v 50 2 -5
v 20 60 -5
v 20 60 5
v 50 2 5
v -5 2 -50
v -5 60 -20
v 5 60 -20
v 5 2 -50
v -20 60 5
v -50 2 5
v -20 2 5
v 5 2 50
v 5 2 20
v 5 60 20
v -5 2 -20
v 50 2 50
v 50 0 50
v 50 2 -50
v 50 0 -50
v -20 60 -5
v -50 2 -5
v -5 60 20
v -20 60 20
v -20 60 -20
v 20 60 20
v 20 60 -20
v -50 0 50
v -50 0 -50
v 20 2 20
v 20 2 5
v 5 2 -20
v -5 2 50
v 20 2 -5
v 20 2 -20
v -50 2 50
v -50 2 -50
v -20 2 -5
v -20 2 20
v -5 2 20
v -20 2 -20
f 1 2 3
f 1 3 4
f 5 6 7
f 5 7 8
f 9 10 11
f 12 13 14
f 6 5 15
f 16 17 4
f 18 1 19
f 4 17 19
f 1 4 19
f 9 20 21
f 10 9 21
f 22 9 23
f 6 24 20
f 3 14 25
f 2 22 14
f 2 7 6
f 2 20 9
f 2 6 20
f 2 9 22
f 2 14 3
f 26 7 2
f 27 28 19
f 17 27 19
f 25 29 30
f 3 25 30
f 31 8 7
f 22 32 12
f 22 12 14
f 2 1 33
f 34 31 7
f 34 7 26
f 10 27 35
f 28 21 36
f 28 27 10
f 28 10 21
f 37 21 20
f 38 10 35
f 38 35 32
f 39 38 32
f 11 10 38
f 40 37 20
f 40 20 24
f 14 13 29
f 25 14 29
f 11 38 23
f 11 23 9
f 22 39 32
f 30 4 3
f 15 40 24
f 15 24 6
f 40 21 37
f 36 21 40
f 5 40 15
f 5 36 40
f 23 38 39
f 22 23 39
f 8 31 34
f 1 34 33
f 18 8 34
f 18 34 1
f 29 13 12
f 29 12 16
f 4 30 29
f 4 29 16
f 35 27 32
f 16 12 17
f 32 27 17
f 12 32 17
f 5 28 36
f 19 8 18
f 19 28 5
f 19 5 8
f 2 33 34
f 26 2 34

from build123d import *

# Parameters (mm, degrees)
CROQUIS2_W                   = 100
CROQUIS2_H                   = 100
CROQUIS2_W_2                 = 40
CROQUIS2_H_2                 = 40
SALIENTE_EXTRUIR1_DEPTH      = 2
CROQUIS2_2_W                 = 40
CROQUIS2_2_H                 = 40
SALIENTE_EXTRUIR2_DEPTH      = 60
SALIENTE_EXTRUIR3_DEPTH      = 5
SALIENTE_EXTRUIR3_DEPTH_BACK = 5
SALIENTE_EXTRUIR4_DEPTH      = 5
SALIENTE_EXTRUIR4_DEPTH_BACK = 5


with BuildPart() as part:
    # Croquis2 → Saliente-Extruir1 (new body)
    with BuildSketch(Plane(origin=(0, 0, 0), x_dir=(1, 0, 0), z_dir=(0, 1, 0))):
        Rectangle(CROQUIS2_W, CROQUIS2_H)
        Rectangle(CROQUIS2_W_2, CROQUIS2_H_2, mode=Mode.SUBTRACT)
    extrude(amount=SALIENTE_EXTRUIR1_DEPTH)

    # Croquis2<2> → Saliente-Extruir2 (add)
    with BuildSketch(Plane(origin=(0, 0, 0), x_dir=(1, 0, 0), z_dir=(0, 1, 0))):
        Rectangle(CROQUIS2_2_W, CROQUIS2_2_H)
    extrude(amount=SALIENTE_EXTRUIR2_DEPTH)

    # Croquis4 → Saliente-Extruir3 (add, two sides: drawn at the far end of the back side and taken through both)
    with BuildSketch(Plane(origin=(0, 0, 0), x_dir=(0, 0, -1), z_dir=(1, 0, 0)).offset(-SALIENTE_EXTRUIR3_DEPTH_BACK)):
        Polygon((20, 60), (50, 2), (20, 2), align=None)
        Polygon((-20, 2), (-50, 2), (-20, 60), align=None)
    extrude(amount=SALIENTE_EXTRUIR3_DEPTH + SALIENTE_EXTRUIR3_DEPTH_BACK)

    # Croquis5 → Saliente-Extruir4 (add, two sides: drawn at the far end of the back side and taken through both)
    with BuildSketch(Plane.XY.offset(-SALIENTE_EXTRUIR4_DEPTH_BACK)):
        Polygon((20, 60), (50, 2), (20, 2), align=None)
        Polygon((-20, 60), (-50, 2), (-20, 2), align=None)
    extrude(amount=SALIENTE_EXTRUIR4_DEPTH + SALIENTE_EXTRUIR4_DEPTH_BACK)


solid = part.part
